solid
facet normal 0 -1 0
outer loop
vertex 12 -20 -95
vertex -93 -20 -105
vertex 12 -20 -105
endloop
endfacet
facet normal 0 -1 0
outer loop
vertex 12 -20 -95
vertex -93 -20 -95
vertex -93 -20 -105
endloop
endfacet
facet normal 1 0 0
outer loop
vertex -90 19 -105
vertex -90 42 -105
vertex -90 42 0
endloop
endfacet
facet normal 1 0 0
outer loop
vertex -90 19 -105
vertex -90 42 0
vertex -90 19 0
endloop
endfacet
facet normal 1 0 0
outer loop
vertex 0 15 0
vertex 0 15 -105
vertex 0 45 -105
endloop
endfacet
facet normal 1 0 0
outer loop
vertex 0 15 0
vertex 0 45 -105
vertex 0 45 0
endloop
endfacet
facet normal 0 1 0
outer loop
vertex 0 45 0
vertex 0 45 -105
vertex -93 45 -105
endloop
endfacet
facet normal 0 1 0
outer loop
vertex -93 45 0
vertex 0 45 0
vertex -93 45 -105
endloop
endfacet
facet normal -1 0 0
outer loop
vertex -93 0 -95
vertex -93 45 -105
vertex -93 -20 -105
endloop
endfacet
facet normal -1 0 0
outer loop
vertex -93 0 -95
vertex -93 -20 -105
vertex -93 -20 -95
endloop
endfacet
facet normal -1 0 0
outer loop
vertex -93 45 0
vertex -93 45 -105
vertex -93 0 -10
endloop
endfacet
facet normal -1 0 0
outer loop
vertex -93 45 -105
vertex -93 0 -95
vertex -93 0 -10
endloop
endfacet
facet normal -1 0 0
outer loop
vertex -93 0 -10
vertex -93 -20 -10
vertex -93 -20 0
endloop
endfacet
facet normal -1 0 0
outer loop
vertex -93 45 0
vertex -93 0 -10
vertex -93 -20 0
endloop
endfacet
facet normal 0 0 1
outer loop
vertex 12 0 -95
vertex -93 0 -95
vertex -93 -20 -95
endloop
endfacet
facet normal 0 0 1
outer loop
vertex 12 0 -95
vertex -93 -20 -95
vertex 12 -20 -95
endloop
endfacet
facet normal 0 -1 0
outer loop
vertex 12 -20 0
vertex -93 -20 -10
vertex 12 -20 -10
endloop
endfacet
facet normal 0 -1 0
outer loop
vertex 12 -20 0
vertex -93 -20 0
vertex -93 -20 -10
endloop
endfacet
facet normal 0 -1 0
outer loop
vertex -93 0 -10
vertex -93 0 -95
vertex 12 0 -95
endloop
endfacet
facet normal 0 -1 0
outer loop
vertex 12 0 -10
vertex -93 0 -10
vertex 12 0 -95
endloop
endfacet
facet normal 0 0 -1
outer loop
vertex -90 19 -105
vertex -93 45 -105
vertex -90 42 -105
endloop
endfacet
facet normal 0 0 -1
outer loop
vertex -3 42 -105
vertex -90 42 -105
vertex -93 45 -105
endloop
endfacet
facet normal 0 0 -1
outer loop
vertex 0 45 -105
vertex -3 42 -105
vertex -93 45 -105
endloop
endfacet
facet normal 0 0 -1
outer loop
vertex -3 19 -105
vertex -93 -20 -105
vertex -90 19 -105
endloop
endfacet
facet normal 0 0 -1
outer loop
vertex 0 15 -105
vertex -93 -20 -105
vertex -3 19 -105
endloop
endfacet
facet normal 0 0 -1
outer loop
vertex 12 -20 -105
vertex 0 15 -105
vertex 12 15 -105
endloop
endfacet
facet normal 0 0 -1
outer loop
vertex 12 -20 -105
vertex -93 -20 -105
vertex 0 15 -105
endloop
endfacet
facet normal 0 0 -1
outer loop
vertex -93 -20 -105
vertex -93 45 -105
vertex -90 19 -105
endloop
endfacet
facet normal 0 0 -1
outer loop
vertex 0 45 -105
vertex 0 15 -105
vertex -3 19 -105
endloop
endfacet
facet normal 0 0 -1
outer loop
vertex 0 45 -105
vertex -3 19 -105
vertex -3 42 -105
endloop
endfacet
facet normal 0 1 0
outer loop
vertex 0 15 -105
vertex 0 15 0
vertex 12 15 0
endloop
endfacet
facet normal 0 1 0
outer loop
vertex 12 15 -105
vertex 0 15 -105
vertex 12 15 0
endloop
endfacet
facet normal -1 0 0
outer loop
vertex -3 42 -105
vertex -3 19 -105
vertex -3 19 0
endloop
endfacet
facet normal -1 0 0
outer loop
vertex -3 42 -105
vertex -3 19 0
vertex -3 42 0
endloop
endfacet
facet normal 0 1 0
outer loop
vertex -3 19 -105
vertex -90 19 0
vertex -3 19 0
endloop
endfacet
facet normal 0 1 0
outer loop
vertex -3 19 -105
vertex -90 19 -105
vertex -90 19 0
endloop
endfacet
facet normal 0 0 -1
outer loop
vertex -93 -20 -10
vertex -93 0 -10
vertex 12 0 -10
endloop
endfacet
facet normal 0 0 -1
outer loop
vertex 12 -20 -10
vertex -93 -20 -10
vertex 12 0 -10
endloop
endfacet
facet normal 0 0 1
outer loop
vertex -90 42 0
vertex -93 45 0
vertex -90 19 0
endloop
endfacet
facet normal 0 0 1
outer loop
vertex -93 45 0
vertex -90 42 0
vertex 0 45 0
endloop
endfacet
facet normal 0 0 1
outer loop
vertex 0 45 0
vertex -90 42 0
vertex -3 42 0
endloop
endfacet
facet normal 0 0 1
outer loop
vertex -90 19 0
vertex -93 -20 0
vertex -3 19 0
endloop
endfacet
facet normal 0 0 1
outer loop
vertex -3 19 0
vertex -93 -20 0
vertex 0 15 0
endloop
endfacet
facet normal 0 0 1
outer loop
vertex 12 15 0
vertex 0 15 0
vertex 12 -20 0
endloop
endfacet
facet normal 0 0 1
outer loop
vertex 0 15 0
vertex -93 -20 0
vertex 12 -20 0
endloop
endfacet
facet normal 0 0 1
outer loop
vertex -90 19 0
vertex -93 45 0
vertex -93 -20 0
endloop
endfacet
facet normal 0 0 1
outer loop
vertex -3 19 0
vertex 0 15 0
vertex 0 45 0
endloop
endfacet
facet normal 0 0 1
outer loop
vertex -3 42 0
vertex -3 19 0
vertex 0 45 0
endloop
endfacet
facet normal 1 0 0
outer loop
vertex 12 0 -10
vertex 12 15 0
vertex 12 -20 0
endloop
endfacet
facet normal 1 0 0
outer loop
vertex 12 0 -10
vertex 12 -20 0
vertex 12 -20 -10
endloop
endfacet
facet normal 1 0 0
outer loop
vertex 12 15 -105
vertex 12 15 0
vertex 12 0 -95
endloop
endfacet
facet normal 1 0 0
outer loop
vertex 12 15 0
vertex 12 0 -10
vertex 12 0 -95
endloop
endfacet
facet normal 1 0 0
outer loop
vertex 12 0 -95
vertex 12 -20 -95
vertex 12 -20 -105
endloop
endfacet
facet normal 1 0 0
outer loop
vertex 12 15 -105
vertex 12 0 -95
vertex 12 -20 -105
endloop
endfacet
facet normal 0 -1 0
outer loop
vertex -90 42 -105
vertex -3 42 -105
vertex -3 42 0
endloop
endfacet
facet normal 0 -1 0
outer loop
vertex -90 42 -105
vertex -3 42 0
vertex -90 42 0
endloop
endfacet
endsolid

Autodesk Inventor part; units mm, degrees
ref_plane "YZ Plane" through (0, 0, 0) normal (1, 0, 0) x (0, 1, 0)
ref_plane "XZ Plane" through (0, 0, 0) normal (0, 1, 0) x (-1, 0, 0)
ref_plane "XY Plane" through (0, 0, 0) normal (0, 0, 1) x (1, 0, 0)
sketch "Skizze1" plane through (0, 0, 0) normal (0, 1, 0) x (-1, 0, 0)
  line L0 (0, 0) -> (105, 0)
  line L1 (105, 0) -> (105, -105)
  line L2 (105, -105) -> (0, -105)
  line L3 (0, -105) -> (0, 0)
  line L4 (0, -105) -> (93, -105)
  line L5 (93, -105) -> (93, 0)
  line L6 (93, 0) -> (0, 0)
  line L7 (0, 0) -> (0, -105)
  dimension "d0" = 105
  dimension "d1" = 105
  dimension "d2" = 93
extrude "Extrusion1" add sketch "Skizze1" along normal blind 45 contours L0 L5 L2 L3
sketch "Skizze2" plane through (0, 0, 0) normal (0, -1, 0) x (1, 0, 0)
  line L0 (0, -105) -> (-93, -105) projected
  line L1 (-93, -105) -> (12, -105)
  line L2 (12, -105) -> (12, 0)
  line L3 (12, 0) -> (-93, 0)
  line L4 (-93, 0) -> (-93, -105)
  line L5 (-93, -105) -> (-93, 0) projected
  line L6 (12, -105) -> (-93, -105)
  line L7 (-93, -105) -> (-93, -95)
  line L8 (-93, -95) -> (12, -95)
  line L9 (12, -95) -> (12, -105)
  line L10 (12, 0) -> (-93, 0)
  line L11 (-93, 0) -> (-93, -10)
  line L12 (-93, -10) -> (12, -10)
  line L13 (12, -10) -> (12, 0)
  point P0 (0, 0)
  point P1 (12, -10)
  point P2 (12, -95)
  dimension "d5" = 105
  dimension "d6" = 10
  dimension "d7" = 10
extrude "Extrusion2" add sketch "Skizze2" along normal blind 20 contours L0 L4 L8 L2 L1 | L4 L3 L2 L12
sketch "Skizze3" plane through (0, 0, 0) normal (0, 1, 0) x (1, 0, 0)
  line L0 (-93, 0) -> (0, 0) projected
  line L1 (0, 105) -> (12, 105) projected
  line L2 (0, 0) -> (12, 0)
  line L3 (12, 0) -> (12, 105)
  line L4 (12, 105) -> (0, 105)
  line L5 (0, 105) -> (0, 0)
extrude "Extrusion3" add sketch "Skizze3" along normal blind 15
sketch "Skizze4" plane through (0, 45, -105) normal (0, 0, -1) x (-1, 0, 0)
  line L0 (93, -65) -> (93, 0) projected
  line L1 (0, 0) -> (93, 0) projected
  line L2 (0, -30) -> (0, 0) projected
  line L3 (-12, -30) -> (0, -30) projected
  line L4 (-12, -30) -> (-12, -65) projected
  line L5 (93, -65) -> (-12, -65) projected
  line L6 (3, -3) -> (90, -3)
  line L7 (90, -3) -> (90, -26)
  line L8 (90, -26) -> (3, -26)
  line L9 (3, -26) -> (3, -3)
  point P0 (0, -45)
  point P1 (46.5, -3)
  point P2 (46.5, 0)
  dimension "d12" = 3
  dimension "d13" = 3
  dimension "d14" = 23
extrude "Extrusion4" cut sketch "Skizze4" against normal through all contours L6 L7 L8 L9
equation "\"d0\" = base_breite"
equation "\"d1\" = base_tiefe"
equation "\"d2\" = koerper_breite"
equation "\"d3\" = hoehe - fuss_höhe"
equation "\"d5\" = base_breite"
equation "\"d6\" = fuss_breite"
equation "\"d7\" = fuss_breite"
equation "\"d8\" = fuss_höhe"
equation "\"d10\" = PCI_hoehe"
equation "\"d12\" = koerper_wandstaerke"
equation "\"d13\" = koerper_wandstaerke"
equation "\"d14\" = kuehlöffnung"
equation "\"base_breite\" = 105"
equation "\"base_tiefe\" = 105"
equation "\"fuss_breite\" = 10"
equation "\"koerper_breite\" = 93"
equation "\"koerper_tiefe\" = 105"
equation "\"fuss_höhe\" = 20"
equation "\"hoehe\" = 65"
equation "\"PCI_hoehe\" = 15"
equation "\"koerper_wandstaerke\" = 3"
equation "\"kuehlöffnung\" = 23"
properties part number "jetson_dummy"
